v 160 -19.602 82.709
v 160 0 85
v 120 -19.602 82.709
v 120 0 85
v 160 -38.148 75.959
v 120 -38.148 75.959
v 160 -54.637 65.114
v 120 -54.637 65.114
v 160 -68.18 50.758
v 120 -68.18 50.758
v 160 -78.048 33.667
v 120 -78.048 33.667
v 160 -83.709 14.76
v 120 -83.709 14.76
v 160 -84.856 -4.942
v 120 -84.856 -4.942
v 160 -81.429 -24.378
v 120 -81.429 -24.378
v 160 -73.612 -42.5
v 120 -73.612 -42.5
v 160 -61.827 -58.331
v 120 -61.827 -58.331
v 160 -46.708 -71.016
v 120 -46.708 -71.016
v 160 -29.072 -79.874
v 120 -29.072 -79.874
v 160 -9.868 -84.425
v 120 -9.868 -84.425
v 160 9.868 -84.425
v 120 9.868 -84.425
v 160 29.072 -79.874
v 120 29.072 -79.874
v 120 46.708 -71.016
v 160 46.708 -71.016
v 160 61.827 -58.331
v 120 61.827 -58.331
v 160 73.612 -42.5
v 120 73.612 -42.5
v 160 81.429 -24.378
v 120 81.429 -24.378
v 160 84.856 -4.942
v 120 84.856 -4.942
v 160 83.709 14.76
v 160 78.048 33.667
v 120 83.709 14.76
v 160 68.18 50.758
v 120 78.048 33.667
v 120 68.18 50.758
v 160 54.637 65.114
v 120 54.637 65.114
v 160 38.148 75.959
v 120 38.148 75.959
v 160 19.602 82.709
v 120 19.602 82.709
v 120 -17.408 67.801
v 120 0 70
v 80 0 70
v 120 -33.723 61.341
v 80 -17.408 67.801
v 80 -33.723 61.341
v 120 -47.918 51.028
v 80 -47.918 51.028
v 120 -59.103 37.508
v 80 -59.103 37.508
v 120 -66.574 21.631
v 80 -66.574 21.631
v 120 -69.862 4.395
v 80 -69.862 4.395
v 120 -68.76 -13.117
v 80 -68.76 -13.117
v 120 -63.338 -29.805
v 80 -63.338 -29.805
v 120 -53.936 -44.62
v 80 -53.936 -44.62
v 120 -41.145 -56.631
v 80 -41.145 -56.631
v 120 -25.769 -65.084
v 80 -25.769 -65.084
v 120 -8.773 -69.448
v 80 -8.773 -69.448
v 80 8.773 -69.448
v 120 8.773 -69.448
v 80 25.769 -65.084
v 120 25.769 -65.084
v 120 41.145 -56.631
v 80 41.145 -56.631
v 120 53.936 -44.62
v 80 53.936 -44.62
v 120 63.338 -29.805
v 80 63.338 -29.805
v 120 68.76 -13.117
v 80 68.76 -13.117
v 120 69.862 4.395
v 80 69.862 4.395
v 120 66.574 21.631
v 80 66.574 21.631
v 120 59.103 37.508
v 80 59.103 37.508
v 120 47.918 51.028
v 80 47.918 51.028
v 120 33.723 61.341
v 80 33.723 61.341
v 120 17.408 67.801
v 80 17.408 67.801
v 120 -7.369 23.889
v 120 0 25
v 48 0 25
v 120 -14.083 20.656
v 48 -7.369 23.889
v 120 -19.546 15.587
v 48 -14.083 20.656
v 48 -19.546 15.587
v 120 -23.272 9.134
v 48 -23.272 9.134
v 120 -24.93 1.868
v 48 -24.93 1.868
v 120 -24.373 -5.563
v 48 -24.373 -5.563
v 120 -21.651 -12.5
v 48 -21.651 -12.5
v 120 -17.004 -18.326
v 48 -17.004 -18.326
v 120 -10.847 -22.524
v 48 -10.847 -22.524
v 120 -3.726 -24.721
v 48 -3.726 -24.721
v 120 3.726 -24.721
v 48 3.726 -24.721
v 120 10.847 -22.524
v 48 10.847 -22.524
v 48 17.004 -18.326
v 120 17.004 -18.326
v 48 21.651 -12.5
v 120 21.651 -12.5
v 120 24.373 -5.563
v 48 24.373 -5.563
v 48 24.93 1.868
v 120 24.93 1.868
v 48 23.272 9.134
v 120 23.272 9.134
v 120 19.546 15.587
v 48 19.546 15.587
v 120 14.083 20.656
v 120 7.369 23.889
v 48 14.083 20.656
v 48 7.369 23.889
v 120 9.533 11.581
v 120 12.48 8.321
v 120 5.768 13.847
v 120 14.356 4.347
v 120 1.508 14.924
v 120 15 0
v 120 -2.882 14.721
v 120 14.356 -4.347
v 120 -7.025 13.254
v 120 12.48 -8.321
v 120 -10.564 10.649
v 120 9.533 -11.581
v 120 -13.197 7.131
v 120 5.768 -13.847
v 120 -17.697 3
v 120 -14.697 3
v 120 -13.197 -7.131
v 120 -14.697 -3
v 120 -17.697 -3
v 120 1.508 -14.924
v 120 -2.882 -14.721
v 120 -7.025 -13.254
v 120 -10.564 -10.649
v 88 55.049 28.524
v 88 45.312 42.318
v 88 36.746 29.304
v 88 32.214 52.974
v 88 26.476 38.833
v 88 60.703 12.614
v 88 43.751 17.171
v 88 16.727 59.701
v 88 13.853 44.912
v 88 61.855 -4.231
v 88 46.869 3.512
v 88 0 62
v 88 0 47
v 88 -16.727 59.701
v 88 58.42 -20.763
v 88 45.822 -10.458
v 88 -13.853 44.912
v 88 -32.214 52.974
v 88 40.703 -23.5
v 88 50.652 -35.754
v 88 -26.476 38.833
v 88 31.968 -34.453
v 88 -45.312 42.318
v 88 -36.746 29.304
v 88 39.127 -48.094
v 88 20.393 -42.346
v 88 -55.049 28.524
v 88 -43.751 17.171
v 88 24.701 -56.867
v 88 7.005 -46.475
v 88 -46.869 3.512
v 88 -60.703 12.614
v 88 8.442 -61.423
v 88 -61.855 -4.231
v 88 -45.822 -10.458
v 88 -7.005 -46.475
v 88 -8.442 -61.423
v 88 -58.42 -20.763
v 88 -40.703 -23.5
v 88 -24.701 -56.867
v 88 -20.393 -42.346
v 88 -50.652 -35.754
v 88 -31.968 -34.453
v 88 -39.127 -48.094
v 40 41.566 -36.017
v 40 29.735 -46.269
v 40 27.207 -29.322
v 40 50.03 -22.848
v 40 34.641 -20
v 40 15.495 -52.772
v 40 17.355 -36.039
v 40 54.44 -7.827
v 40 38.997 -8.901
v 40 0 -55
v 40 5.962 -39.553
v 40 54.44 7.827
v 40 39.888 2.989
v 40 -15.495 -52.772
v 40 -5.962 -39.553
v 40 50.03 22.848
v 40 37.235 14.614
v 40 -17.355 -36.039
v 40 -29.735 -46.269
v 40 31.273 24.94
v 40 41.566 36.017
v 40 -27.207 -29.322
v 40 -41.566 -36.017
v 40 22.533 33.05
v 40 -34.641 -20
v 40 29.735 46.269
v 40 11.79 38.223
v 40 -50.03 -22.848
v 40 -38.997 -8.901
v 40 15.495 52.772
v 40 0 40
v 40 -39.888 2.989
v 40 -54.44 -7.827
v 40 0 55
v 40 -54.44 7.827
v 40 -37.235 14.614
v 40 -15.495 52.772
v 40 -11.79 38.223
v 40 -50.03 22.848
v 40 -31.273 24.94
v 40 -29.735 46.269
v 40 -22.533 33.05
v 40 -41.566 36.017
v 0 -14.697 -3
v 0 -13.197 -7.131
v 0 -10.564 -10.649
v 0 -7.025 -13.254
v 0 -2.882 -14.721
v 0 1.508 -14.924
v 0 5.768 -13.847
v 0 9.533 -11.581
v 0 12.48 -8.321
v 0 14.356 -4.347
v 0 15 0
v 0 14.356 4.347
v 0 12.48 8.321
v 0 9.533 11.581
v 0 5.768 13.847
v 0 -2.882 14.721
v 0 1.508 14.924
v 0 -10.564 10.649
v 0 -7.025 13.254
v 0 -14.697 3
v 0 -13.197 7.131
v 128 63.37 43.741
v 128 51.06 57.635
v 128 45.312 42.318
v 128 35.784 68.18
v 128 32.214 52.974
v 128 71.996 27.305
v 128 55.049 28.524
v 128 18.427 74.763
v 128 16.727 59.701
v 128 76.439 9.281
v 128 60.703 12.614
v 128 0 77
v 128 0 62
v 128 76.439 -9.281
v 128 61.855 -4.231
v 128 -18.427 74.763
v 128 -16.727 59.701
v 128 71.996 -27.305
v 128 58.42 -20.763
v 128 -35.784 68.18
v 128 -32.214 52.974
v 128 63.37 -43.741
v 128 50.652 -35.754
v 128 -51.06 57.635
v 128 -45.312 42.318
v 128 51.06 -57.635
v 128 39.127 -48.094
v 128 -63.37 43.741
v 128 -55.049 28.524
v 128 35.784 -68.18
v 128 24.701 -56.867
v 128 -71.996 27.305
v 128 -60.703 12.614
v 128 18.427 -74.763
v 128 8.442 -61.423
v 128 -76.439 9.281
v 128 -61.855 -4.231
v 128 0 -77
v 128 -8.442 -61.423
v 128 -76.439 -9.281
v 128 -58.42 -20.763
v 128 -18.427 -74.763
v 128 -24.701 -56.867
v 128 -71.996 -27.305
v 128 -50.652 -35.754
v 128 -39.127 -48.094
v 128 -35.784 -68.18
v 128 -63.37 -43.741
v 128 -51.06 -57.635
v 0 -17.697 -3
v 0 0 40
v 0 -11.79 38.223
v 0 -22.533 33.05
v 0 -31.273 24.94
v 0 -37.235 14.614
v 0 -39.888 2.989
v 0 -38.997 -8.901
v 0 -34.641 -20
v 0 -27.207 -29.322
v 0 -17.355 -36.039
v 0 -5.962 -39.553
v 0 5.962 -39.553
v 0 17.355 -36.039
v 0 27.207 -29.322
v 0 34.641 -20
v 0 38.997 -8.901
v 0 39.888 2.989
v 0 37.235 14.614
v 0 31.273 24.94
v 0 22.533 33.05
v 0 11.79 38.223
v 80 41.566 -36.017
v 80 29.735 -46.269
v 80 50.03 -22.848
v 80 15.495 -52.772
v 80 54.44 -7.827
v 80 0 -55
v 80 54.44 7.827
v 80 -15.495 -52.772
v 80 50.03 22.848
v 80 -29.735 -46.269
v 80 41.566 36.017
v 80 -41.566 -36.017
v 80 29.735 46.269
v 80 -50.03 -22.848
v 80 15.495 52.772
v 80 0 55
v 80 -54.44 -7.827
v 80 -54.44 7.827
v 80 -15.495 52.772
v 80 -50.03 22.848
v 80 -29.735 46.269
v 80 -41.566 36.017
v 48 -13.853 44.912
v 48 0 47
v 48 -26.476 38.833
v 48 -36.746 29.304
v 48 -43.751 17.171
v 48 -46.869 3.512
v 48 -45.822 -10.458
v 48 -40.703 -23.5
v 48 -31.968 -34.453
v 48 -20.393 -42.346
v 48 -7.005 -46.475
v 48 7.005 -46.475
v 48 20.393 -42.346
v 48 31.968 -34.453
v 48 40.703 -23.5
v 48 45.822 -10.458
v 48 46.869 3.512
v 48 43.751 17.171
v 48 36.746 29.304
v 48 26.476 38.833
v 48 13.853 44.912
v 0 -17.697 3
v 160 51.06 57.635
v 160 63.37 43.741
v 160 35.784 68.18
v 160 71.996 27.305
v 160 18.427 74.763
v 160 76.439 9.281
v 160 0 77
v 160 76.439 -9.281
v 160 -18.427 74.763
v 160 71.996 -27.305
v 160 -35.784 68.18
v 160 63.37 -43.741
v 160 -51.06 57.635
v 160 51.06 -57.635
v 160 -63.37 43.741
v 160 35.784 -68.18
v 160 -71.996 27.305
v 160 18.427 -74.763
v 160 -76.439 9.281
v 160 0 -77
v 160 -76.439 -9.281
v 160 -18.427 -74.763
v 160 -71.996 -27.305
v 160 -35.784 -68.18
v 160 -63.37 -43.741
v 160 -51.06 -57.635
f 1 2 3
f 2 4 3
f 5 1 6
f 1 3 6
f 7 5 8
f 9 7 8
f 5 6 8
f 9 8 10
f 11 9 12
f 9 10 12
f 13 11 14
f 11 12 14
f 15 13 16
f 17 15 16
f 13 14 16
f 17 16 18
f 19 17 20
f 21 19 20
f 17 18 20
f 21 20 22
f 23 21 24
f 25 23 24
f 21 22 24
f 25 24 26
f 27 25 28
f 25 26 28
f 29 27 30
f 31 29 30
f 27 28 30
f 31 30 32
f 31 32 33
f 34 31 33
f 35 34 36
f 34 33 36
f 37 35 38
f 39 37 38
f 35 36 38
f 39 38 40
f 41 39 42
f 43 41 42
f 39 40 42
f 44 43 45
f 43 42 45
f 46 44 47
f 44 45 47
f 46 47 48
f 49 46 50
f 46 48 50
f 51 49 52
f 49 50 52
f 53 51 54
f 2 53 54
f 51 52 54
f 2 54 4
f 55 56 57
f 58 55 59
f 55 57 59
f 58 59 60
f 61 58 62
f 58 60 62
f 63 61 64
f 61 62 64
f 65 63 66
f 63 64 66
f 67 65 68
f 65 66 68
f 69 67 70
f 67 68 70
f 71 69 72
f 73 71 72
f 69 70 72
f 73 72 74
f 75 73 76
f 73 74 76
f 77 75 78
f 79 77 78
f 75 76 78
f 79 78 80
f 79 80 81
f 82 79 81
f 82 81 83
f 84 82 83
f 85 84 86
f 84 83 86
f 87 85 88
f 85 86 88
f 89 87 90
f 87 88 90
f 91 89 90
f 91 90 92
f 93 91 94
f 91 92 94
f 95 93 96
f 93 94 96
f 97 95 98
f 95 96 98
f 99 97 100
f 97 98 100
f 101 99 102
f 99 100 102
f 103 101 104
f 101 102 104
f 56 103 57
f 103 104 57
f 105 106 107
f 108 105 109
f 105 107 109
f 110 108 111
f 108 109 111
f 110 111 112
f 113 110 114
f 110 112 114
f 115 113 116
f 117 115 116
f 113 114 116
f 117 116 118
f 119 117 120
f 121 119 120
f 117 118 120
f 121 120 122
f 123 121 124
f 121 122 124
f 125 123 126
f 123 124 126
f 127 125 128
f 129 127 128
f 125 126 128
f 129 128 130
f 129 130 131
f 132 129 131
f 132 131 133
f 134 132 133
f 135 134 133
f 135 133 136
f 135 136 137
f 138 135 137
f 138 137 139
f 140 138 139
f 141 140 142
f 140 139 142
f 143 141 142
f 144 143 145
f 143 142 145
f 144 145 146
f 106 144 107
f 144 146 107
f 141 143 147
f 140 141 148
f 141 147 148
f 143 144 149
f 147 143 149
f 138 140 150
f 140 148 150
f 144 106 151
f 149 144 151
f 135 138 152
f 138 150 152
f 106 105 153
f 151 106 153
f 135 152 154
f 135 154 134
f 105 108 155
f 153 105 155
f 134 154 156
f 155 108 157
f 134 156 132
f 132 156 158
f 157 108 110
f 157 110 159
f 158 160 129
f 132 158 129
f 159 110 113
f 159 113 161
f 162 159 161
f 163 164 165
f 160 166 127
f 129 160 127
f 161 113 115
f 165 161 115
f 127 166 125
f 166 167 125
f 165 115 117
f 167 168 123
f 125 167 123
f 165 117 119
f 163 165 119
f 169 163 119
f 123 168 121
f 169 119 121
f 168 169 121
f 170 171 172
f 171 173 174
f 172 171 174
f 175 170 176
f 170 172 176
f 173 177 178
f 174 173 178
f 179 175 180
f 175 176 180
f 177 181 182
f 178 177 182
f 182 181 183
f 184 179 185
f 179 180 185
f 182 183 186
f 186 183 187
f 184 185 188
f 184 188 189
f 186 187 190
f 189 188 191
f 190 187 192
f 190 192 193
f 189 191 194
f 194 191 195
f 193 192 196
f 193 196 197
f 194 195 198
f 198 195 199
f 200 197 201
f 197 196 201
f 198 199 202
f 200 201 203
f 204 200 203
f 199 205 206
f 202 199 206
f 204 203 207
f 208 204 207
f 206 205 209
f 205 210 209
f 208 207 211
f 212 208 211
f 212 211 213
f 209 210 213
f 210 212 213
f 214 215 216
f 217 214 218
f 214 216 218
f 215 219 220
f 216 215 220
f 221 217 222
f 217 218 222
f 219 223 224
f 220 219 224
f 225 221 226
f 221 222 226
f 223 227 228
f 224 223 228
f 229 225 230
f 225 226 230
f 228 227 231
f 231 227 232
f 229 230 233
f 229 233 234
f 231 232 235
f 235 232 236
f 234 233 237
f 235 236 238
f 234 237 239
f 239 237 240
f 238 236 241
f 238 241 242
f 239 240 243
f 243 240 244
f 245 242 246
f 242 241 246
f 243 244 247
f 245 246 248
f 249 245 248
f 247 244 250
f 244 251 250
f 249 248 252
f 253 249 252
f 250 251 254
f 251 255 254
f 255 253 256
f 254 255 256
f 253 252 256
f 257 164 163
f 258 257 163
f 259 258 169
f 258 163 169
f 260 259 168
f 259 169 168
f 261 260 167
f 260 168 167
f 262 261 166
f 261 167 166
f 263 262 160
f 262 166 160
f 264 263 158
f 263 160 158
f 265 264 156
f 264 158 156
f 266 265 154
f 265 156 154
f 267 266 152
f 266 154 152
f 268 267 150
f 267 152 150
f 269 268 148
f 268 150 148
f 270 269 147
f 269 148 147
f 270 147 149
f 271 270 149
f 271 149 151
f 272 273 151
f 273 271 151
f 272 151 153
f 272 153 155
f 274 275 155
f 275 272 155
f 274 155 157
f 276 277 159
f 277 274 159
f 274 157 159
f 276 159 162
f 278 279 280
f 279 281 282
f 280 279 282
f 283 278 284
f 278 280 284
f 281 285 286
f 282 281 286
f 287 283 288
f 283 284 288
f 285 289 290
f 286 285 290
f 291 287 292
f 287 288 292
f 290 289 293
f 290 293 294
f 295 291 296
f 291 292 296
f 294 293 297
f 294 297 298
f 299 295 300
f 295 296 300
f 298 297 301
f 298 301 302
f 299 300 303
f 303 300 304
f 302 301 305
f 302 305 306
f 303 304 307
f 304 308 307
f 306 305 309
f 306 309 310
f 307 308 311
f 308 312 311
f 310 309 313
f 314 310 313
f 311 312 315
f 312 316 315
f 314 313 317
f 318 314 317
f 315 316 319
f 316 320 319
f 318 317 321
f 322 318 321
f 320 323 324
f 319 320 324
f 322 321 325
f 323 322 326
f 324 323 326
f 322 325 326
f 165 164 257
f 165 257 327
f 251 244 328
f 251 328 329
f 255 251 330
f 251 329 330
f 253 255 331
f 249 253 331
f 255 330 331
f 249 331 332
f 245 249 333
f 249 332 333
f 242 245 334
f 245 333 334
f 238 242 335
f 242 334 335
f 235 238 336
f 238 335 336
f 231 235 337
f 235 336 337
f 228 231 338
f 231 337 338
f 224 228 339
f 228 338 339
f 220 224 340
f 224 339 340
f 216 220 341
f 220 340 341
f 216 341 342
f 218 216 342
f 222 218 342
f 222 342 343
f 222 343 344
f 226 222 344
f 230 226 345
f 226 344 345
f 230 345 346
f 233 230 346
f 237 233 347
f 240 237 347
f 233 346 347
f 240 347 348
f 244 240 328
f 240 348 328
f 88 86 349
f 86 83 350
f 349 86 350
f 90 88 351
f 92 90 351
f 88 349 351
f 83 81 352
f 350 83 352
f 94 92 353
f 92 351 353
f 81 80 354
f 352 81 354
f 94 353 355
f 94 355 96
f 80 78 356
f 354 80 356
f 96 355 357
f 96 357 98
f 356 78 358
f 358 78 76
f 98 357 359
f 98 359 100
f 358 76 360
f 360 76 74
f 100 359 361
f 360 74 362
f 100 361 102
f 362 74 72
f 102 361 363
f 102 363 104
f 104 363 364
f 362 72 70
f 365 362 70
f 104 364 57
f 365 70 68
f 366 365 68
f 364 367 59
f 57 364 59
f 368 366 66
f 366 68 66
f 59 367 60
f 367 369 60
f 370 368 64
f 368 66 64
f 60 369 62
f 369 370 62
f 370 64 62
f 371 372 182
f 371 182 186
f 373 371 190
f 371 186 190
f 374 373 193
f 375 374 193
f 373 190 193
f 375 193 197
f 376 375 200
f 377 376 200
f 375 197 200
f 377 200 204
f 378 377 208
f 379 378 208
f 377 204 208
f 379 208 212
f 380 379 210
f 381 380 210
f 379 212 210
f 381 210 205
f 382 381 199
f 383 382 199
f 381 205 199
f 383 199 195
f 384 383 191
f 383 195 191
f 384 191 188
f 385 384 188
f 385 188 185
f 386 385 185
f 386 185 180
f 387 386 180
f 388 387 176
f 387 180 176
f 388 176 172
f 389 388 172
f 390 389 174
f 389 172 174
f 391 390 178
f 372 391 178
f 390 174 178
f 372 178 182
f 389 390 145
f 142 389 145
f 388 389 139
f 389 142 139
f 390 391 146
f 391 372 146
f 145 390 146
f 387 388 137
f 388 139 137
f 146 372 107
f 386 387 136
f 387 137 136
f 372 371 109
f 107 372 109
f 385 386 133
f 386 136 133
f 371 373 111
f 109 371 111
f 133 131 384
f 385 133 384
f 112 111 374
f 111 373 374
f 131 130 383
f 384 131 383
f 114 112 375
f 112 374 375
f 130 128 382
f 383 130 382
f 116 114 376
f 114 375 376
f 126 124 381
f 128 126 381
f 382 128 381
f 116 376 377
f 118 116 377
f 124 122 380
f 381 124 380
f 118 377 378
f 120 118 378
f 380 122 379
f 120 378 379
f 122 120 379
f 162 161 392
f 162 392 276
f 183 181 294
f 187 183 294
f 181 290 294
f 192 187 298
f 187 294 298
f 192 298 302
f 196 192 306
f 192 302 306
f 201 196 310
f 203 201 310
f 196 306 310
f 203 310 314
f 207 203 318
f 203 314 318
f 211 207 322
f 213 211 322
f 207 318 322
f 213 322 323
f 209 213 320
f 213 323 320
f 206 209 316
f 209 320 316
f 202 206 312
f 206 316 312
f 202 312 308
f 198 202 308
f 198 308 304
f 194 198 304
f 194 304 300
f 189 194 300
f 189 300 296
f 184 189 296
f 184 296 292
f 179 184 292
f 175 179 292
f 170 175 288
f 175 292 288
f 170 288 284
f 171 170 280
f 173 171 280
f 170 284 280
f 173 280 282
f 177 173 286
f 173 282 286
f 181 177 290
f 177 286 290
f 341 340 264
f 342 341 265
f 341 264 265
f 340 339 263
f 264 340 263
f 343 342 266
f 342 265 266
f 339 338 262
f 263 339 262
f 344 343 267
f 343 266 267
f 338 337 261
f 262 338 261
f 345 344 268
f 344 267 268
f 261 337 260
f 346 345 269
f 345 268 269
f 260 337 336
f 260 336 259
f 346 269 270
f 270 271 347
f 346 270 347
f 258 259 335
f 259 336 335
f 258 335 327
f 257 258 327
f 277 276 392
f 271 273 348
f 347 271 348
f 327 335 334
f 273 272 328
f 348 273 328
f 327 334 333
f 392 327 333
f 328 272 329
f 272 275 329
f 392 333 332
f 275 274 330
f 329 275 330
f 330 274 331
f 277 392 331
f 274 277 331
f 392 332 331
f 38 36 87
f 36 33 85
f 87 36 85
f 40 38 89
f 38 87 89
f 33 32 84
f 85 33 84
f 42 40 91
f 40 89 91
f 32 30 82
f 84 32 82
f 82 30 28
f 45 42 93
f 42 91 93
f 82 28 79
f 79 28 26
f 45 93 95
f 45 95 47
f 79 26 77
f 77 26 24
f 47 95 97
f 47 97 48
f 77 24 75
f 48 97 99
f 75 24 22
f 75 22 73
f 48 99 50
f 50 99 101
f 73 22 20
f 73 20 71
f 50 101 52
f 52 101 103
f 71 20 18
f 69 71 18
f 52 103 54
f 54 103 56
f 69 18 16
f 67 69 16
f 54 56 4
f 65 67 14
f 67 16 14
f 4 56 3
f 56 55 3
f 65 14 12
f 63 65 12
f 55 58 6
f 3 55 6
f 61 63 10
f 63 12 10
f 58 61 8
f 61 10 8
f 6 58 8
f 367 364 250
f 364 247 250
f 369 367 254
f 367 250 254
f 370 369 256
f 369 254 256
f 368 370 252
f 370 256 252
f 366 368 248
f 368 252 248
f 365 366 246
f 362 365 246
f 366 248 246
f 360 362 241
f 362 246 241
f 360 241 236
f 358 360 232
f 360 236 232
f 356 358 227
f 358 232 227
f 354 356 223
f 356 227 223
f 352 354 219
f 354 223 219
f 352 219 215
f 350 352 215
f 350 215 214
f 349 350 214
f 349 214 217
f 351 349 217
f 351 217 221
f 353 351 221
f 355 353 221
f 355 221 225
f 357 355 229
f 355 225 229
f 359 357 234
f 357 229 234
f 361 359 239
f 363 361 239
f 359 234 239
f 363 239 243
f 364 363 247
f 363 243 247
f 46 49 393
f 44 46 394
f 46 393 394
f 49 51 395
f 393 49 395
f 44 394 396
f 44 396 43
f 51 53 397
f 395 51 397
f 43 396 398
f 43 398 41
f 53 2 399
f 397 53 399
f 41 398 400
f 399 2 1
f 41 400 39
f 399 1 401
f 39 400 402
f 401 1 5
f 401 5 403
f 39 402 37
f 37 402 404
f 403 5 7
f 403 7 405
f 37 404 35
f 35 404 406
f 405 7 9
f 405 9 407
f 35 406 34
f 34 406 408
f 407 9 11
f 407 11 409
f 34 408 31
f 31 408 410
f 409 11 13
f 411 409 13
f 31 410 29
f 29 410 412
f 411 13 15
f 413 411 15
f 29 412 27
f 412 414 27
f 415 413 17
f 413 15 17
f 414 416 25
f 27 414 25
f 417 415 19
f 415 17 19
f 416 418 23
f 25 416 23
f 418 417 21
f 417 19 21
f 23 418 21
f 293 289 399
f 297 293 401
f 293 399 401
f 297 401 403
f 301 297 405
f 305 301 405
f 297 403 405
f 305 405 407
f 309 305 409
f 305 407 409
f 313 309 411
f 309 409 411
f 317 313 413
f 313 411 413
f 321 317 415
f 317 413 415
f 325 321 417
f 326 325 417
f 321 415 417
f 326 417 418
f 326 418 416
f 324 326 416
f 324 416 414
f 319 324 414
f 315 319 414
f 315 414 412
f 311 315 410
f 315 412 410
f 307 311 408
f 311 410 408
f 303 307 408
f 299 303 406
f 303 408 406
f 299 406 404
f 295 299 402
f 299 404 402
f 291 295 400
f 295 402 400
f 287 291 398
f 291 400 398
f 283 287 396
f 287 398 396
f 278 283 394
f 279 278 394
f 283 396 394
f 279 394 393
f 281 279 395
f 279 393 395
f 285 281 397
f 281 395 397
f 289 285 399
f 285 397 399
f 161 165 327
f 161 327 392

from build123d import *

# Parameters (mm, degrees)
CUT_EXTRUDE1_DEPTH      = 201.124960962
CUT_EXTRUDE1_DEPTH_BACK = 201.124960962


with BuildPart() as part:
    # Sketch2 → Revolve1 (revolve)
    with BuildSketch(Plane.XY, mode=Mode.PRIVATE) as revolve1_sk:
        Polygon((0, 15), (120, 15), (120, 25), (48, 25), (48, 47), (88, 47), (88, 62), (128, 62), (128, 77), (160, 77), (160, 85), (120, 85), (120, 70), (80, 70), (80, 55), (40, 55), (40, 40), (0, 40), align=None)
    revolve(revolve1_sk.sketch.rotate(Axis((-111.650485437, 0, 0), (1, 0, 0)), 90), axis=Axis((-111.650485437, 0, 0), (1, 0, 0)))

    # Sketch3 → Cut-Extrude1 (cut, two sides: drawn at the far end of the back side and taken through both)
    with BuildSketch(Plane.ZY.offset(-CUT_EXTRUDE1_DEPTH_BACK)):
        with BuildLine():
            Line((-3, -14.696938457), (-3, -17.696938457))
            Line((-3, -17.696938457), (3, -17.696938457))
            Line((3, -17.696938457), (3, -14.696938457))
            ThreePointArc((3, -14.696938457), (0, 15), (-3, -14.696938457))
        make_face()
    extrude(amount=CUT_EXTRUDE1_DEPTH + CUT_EXTRUDE1_DEPTH_BACK, mode=Mode.SUBTRACT)


solid = part.part
